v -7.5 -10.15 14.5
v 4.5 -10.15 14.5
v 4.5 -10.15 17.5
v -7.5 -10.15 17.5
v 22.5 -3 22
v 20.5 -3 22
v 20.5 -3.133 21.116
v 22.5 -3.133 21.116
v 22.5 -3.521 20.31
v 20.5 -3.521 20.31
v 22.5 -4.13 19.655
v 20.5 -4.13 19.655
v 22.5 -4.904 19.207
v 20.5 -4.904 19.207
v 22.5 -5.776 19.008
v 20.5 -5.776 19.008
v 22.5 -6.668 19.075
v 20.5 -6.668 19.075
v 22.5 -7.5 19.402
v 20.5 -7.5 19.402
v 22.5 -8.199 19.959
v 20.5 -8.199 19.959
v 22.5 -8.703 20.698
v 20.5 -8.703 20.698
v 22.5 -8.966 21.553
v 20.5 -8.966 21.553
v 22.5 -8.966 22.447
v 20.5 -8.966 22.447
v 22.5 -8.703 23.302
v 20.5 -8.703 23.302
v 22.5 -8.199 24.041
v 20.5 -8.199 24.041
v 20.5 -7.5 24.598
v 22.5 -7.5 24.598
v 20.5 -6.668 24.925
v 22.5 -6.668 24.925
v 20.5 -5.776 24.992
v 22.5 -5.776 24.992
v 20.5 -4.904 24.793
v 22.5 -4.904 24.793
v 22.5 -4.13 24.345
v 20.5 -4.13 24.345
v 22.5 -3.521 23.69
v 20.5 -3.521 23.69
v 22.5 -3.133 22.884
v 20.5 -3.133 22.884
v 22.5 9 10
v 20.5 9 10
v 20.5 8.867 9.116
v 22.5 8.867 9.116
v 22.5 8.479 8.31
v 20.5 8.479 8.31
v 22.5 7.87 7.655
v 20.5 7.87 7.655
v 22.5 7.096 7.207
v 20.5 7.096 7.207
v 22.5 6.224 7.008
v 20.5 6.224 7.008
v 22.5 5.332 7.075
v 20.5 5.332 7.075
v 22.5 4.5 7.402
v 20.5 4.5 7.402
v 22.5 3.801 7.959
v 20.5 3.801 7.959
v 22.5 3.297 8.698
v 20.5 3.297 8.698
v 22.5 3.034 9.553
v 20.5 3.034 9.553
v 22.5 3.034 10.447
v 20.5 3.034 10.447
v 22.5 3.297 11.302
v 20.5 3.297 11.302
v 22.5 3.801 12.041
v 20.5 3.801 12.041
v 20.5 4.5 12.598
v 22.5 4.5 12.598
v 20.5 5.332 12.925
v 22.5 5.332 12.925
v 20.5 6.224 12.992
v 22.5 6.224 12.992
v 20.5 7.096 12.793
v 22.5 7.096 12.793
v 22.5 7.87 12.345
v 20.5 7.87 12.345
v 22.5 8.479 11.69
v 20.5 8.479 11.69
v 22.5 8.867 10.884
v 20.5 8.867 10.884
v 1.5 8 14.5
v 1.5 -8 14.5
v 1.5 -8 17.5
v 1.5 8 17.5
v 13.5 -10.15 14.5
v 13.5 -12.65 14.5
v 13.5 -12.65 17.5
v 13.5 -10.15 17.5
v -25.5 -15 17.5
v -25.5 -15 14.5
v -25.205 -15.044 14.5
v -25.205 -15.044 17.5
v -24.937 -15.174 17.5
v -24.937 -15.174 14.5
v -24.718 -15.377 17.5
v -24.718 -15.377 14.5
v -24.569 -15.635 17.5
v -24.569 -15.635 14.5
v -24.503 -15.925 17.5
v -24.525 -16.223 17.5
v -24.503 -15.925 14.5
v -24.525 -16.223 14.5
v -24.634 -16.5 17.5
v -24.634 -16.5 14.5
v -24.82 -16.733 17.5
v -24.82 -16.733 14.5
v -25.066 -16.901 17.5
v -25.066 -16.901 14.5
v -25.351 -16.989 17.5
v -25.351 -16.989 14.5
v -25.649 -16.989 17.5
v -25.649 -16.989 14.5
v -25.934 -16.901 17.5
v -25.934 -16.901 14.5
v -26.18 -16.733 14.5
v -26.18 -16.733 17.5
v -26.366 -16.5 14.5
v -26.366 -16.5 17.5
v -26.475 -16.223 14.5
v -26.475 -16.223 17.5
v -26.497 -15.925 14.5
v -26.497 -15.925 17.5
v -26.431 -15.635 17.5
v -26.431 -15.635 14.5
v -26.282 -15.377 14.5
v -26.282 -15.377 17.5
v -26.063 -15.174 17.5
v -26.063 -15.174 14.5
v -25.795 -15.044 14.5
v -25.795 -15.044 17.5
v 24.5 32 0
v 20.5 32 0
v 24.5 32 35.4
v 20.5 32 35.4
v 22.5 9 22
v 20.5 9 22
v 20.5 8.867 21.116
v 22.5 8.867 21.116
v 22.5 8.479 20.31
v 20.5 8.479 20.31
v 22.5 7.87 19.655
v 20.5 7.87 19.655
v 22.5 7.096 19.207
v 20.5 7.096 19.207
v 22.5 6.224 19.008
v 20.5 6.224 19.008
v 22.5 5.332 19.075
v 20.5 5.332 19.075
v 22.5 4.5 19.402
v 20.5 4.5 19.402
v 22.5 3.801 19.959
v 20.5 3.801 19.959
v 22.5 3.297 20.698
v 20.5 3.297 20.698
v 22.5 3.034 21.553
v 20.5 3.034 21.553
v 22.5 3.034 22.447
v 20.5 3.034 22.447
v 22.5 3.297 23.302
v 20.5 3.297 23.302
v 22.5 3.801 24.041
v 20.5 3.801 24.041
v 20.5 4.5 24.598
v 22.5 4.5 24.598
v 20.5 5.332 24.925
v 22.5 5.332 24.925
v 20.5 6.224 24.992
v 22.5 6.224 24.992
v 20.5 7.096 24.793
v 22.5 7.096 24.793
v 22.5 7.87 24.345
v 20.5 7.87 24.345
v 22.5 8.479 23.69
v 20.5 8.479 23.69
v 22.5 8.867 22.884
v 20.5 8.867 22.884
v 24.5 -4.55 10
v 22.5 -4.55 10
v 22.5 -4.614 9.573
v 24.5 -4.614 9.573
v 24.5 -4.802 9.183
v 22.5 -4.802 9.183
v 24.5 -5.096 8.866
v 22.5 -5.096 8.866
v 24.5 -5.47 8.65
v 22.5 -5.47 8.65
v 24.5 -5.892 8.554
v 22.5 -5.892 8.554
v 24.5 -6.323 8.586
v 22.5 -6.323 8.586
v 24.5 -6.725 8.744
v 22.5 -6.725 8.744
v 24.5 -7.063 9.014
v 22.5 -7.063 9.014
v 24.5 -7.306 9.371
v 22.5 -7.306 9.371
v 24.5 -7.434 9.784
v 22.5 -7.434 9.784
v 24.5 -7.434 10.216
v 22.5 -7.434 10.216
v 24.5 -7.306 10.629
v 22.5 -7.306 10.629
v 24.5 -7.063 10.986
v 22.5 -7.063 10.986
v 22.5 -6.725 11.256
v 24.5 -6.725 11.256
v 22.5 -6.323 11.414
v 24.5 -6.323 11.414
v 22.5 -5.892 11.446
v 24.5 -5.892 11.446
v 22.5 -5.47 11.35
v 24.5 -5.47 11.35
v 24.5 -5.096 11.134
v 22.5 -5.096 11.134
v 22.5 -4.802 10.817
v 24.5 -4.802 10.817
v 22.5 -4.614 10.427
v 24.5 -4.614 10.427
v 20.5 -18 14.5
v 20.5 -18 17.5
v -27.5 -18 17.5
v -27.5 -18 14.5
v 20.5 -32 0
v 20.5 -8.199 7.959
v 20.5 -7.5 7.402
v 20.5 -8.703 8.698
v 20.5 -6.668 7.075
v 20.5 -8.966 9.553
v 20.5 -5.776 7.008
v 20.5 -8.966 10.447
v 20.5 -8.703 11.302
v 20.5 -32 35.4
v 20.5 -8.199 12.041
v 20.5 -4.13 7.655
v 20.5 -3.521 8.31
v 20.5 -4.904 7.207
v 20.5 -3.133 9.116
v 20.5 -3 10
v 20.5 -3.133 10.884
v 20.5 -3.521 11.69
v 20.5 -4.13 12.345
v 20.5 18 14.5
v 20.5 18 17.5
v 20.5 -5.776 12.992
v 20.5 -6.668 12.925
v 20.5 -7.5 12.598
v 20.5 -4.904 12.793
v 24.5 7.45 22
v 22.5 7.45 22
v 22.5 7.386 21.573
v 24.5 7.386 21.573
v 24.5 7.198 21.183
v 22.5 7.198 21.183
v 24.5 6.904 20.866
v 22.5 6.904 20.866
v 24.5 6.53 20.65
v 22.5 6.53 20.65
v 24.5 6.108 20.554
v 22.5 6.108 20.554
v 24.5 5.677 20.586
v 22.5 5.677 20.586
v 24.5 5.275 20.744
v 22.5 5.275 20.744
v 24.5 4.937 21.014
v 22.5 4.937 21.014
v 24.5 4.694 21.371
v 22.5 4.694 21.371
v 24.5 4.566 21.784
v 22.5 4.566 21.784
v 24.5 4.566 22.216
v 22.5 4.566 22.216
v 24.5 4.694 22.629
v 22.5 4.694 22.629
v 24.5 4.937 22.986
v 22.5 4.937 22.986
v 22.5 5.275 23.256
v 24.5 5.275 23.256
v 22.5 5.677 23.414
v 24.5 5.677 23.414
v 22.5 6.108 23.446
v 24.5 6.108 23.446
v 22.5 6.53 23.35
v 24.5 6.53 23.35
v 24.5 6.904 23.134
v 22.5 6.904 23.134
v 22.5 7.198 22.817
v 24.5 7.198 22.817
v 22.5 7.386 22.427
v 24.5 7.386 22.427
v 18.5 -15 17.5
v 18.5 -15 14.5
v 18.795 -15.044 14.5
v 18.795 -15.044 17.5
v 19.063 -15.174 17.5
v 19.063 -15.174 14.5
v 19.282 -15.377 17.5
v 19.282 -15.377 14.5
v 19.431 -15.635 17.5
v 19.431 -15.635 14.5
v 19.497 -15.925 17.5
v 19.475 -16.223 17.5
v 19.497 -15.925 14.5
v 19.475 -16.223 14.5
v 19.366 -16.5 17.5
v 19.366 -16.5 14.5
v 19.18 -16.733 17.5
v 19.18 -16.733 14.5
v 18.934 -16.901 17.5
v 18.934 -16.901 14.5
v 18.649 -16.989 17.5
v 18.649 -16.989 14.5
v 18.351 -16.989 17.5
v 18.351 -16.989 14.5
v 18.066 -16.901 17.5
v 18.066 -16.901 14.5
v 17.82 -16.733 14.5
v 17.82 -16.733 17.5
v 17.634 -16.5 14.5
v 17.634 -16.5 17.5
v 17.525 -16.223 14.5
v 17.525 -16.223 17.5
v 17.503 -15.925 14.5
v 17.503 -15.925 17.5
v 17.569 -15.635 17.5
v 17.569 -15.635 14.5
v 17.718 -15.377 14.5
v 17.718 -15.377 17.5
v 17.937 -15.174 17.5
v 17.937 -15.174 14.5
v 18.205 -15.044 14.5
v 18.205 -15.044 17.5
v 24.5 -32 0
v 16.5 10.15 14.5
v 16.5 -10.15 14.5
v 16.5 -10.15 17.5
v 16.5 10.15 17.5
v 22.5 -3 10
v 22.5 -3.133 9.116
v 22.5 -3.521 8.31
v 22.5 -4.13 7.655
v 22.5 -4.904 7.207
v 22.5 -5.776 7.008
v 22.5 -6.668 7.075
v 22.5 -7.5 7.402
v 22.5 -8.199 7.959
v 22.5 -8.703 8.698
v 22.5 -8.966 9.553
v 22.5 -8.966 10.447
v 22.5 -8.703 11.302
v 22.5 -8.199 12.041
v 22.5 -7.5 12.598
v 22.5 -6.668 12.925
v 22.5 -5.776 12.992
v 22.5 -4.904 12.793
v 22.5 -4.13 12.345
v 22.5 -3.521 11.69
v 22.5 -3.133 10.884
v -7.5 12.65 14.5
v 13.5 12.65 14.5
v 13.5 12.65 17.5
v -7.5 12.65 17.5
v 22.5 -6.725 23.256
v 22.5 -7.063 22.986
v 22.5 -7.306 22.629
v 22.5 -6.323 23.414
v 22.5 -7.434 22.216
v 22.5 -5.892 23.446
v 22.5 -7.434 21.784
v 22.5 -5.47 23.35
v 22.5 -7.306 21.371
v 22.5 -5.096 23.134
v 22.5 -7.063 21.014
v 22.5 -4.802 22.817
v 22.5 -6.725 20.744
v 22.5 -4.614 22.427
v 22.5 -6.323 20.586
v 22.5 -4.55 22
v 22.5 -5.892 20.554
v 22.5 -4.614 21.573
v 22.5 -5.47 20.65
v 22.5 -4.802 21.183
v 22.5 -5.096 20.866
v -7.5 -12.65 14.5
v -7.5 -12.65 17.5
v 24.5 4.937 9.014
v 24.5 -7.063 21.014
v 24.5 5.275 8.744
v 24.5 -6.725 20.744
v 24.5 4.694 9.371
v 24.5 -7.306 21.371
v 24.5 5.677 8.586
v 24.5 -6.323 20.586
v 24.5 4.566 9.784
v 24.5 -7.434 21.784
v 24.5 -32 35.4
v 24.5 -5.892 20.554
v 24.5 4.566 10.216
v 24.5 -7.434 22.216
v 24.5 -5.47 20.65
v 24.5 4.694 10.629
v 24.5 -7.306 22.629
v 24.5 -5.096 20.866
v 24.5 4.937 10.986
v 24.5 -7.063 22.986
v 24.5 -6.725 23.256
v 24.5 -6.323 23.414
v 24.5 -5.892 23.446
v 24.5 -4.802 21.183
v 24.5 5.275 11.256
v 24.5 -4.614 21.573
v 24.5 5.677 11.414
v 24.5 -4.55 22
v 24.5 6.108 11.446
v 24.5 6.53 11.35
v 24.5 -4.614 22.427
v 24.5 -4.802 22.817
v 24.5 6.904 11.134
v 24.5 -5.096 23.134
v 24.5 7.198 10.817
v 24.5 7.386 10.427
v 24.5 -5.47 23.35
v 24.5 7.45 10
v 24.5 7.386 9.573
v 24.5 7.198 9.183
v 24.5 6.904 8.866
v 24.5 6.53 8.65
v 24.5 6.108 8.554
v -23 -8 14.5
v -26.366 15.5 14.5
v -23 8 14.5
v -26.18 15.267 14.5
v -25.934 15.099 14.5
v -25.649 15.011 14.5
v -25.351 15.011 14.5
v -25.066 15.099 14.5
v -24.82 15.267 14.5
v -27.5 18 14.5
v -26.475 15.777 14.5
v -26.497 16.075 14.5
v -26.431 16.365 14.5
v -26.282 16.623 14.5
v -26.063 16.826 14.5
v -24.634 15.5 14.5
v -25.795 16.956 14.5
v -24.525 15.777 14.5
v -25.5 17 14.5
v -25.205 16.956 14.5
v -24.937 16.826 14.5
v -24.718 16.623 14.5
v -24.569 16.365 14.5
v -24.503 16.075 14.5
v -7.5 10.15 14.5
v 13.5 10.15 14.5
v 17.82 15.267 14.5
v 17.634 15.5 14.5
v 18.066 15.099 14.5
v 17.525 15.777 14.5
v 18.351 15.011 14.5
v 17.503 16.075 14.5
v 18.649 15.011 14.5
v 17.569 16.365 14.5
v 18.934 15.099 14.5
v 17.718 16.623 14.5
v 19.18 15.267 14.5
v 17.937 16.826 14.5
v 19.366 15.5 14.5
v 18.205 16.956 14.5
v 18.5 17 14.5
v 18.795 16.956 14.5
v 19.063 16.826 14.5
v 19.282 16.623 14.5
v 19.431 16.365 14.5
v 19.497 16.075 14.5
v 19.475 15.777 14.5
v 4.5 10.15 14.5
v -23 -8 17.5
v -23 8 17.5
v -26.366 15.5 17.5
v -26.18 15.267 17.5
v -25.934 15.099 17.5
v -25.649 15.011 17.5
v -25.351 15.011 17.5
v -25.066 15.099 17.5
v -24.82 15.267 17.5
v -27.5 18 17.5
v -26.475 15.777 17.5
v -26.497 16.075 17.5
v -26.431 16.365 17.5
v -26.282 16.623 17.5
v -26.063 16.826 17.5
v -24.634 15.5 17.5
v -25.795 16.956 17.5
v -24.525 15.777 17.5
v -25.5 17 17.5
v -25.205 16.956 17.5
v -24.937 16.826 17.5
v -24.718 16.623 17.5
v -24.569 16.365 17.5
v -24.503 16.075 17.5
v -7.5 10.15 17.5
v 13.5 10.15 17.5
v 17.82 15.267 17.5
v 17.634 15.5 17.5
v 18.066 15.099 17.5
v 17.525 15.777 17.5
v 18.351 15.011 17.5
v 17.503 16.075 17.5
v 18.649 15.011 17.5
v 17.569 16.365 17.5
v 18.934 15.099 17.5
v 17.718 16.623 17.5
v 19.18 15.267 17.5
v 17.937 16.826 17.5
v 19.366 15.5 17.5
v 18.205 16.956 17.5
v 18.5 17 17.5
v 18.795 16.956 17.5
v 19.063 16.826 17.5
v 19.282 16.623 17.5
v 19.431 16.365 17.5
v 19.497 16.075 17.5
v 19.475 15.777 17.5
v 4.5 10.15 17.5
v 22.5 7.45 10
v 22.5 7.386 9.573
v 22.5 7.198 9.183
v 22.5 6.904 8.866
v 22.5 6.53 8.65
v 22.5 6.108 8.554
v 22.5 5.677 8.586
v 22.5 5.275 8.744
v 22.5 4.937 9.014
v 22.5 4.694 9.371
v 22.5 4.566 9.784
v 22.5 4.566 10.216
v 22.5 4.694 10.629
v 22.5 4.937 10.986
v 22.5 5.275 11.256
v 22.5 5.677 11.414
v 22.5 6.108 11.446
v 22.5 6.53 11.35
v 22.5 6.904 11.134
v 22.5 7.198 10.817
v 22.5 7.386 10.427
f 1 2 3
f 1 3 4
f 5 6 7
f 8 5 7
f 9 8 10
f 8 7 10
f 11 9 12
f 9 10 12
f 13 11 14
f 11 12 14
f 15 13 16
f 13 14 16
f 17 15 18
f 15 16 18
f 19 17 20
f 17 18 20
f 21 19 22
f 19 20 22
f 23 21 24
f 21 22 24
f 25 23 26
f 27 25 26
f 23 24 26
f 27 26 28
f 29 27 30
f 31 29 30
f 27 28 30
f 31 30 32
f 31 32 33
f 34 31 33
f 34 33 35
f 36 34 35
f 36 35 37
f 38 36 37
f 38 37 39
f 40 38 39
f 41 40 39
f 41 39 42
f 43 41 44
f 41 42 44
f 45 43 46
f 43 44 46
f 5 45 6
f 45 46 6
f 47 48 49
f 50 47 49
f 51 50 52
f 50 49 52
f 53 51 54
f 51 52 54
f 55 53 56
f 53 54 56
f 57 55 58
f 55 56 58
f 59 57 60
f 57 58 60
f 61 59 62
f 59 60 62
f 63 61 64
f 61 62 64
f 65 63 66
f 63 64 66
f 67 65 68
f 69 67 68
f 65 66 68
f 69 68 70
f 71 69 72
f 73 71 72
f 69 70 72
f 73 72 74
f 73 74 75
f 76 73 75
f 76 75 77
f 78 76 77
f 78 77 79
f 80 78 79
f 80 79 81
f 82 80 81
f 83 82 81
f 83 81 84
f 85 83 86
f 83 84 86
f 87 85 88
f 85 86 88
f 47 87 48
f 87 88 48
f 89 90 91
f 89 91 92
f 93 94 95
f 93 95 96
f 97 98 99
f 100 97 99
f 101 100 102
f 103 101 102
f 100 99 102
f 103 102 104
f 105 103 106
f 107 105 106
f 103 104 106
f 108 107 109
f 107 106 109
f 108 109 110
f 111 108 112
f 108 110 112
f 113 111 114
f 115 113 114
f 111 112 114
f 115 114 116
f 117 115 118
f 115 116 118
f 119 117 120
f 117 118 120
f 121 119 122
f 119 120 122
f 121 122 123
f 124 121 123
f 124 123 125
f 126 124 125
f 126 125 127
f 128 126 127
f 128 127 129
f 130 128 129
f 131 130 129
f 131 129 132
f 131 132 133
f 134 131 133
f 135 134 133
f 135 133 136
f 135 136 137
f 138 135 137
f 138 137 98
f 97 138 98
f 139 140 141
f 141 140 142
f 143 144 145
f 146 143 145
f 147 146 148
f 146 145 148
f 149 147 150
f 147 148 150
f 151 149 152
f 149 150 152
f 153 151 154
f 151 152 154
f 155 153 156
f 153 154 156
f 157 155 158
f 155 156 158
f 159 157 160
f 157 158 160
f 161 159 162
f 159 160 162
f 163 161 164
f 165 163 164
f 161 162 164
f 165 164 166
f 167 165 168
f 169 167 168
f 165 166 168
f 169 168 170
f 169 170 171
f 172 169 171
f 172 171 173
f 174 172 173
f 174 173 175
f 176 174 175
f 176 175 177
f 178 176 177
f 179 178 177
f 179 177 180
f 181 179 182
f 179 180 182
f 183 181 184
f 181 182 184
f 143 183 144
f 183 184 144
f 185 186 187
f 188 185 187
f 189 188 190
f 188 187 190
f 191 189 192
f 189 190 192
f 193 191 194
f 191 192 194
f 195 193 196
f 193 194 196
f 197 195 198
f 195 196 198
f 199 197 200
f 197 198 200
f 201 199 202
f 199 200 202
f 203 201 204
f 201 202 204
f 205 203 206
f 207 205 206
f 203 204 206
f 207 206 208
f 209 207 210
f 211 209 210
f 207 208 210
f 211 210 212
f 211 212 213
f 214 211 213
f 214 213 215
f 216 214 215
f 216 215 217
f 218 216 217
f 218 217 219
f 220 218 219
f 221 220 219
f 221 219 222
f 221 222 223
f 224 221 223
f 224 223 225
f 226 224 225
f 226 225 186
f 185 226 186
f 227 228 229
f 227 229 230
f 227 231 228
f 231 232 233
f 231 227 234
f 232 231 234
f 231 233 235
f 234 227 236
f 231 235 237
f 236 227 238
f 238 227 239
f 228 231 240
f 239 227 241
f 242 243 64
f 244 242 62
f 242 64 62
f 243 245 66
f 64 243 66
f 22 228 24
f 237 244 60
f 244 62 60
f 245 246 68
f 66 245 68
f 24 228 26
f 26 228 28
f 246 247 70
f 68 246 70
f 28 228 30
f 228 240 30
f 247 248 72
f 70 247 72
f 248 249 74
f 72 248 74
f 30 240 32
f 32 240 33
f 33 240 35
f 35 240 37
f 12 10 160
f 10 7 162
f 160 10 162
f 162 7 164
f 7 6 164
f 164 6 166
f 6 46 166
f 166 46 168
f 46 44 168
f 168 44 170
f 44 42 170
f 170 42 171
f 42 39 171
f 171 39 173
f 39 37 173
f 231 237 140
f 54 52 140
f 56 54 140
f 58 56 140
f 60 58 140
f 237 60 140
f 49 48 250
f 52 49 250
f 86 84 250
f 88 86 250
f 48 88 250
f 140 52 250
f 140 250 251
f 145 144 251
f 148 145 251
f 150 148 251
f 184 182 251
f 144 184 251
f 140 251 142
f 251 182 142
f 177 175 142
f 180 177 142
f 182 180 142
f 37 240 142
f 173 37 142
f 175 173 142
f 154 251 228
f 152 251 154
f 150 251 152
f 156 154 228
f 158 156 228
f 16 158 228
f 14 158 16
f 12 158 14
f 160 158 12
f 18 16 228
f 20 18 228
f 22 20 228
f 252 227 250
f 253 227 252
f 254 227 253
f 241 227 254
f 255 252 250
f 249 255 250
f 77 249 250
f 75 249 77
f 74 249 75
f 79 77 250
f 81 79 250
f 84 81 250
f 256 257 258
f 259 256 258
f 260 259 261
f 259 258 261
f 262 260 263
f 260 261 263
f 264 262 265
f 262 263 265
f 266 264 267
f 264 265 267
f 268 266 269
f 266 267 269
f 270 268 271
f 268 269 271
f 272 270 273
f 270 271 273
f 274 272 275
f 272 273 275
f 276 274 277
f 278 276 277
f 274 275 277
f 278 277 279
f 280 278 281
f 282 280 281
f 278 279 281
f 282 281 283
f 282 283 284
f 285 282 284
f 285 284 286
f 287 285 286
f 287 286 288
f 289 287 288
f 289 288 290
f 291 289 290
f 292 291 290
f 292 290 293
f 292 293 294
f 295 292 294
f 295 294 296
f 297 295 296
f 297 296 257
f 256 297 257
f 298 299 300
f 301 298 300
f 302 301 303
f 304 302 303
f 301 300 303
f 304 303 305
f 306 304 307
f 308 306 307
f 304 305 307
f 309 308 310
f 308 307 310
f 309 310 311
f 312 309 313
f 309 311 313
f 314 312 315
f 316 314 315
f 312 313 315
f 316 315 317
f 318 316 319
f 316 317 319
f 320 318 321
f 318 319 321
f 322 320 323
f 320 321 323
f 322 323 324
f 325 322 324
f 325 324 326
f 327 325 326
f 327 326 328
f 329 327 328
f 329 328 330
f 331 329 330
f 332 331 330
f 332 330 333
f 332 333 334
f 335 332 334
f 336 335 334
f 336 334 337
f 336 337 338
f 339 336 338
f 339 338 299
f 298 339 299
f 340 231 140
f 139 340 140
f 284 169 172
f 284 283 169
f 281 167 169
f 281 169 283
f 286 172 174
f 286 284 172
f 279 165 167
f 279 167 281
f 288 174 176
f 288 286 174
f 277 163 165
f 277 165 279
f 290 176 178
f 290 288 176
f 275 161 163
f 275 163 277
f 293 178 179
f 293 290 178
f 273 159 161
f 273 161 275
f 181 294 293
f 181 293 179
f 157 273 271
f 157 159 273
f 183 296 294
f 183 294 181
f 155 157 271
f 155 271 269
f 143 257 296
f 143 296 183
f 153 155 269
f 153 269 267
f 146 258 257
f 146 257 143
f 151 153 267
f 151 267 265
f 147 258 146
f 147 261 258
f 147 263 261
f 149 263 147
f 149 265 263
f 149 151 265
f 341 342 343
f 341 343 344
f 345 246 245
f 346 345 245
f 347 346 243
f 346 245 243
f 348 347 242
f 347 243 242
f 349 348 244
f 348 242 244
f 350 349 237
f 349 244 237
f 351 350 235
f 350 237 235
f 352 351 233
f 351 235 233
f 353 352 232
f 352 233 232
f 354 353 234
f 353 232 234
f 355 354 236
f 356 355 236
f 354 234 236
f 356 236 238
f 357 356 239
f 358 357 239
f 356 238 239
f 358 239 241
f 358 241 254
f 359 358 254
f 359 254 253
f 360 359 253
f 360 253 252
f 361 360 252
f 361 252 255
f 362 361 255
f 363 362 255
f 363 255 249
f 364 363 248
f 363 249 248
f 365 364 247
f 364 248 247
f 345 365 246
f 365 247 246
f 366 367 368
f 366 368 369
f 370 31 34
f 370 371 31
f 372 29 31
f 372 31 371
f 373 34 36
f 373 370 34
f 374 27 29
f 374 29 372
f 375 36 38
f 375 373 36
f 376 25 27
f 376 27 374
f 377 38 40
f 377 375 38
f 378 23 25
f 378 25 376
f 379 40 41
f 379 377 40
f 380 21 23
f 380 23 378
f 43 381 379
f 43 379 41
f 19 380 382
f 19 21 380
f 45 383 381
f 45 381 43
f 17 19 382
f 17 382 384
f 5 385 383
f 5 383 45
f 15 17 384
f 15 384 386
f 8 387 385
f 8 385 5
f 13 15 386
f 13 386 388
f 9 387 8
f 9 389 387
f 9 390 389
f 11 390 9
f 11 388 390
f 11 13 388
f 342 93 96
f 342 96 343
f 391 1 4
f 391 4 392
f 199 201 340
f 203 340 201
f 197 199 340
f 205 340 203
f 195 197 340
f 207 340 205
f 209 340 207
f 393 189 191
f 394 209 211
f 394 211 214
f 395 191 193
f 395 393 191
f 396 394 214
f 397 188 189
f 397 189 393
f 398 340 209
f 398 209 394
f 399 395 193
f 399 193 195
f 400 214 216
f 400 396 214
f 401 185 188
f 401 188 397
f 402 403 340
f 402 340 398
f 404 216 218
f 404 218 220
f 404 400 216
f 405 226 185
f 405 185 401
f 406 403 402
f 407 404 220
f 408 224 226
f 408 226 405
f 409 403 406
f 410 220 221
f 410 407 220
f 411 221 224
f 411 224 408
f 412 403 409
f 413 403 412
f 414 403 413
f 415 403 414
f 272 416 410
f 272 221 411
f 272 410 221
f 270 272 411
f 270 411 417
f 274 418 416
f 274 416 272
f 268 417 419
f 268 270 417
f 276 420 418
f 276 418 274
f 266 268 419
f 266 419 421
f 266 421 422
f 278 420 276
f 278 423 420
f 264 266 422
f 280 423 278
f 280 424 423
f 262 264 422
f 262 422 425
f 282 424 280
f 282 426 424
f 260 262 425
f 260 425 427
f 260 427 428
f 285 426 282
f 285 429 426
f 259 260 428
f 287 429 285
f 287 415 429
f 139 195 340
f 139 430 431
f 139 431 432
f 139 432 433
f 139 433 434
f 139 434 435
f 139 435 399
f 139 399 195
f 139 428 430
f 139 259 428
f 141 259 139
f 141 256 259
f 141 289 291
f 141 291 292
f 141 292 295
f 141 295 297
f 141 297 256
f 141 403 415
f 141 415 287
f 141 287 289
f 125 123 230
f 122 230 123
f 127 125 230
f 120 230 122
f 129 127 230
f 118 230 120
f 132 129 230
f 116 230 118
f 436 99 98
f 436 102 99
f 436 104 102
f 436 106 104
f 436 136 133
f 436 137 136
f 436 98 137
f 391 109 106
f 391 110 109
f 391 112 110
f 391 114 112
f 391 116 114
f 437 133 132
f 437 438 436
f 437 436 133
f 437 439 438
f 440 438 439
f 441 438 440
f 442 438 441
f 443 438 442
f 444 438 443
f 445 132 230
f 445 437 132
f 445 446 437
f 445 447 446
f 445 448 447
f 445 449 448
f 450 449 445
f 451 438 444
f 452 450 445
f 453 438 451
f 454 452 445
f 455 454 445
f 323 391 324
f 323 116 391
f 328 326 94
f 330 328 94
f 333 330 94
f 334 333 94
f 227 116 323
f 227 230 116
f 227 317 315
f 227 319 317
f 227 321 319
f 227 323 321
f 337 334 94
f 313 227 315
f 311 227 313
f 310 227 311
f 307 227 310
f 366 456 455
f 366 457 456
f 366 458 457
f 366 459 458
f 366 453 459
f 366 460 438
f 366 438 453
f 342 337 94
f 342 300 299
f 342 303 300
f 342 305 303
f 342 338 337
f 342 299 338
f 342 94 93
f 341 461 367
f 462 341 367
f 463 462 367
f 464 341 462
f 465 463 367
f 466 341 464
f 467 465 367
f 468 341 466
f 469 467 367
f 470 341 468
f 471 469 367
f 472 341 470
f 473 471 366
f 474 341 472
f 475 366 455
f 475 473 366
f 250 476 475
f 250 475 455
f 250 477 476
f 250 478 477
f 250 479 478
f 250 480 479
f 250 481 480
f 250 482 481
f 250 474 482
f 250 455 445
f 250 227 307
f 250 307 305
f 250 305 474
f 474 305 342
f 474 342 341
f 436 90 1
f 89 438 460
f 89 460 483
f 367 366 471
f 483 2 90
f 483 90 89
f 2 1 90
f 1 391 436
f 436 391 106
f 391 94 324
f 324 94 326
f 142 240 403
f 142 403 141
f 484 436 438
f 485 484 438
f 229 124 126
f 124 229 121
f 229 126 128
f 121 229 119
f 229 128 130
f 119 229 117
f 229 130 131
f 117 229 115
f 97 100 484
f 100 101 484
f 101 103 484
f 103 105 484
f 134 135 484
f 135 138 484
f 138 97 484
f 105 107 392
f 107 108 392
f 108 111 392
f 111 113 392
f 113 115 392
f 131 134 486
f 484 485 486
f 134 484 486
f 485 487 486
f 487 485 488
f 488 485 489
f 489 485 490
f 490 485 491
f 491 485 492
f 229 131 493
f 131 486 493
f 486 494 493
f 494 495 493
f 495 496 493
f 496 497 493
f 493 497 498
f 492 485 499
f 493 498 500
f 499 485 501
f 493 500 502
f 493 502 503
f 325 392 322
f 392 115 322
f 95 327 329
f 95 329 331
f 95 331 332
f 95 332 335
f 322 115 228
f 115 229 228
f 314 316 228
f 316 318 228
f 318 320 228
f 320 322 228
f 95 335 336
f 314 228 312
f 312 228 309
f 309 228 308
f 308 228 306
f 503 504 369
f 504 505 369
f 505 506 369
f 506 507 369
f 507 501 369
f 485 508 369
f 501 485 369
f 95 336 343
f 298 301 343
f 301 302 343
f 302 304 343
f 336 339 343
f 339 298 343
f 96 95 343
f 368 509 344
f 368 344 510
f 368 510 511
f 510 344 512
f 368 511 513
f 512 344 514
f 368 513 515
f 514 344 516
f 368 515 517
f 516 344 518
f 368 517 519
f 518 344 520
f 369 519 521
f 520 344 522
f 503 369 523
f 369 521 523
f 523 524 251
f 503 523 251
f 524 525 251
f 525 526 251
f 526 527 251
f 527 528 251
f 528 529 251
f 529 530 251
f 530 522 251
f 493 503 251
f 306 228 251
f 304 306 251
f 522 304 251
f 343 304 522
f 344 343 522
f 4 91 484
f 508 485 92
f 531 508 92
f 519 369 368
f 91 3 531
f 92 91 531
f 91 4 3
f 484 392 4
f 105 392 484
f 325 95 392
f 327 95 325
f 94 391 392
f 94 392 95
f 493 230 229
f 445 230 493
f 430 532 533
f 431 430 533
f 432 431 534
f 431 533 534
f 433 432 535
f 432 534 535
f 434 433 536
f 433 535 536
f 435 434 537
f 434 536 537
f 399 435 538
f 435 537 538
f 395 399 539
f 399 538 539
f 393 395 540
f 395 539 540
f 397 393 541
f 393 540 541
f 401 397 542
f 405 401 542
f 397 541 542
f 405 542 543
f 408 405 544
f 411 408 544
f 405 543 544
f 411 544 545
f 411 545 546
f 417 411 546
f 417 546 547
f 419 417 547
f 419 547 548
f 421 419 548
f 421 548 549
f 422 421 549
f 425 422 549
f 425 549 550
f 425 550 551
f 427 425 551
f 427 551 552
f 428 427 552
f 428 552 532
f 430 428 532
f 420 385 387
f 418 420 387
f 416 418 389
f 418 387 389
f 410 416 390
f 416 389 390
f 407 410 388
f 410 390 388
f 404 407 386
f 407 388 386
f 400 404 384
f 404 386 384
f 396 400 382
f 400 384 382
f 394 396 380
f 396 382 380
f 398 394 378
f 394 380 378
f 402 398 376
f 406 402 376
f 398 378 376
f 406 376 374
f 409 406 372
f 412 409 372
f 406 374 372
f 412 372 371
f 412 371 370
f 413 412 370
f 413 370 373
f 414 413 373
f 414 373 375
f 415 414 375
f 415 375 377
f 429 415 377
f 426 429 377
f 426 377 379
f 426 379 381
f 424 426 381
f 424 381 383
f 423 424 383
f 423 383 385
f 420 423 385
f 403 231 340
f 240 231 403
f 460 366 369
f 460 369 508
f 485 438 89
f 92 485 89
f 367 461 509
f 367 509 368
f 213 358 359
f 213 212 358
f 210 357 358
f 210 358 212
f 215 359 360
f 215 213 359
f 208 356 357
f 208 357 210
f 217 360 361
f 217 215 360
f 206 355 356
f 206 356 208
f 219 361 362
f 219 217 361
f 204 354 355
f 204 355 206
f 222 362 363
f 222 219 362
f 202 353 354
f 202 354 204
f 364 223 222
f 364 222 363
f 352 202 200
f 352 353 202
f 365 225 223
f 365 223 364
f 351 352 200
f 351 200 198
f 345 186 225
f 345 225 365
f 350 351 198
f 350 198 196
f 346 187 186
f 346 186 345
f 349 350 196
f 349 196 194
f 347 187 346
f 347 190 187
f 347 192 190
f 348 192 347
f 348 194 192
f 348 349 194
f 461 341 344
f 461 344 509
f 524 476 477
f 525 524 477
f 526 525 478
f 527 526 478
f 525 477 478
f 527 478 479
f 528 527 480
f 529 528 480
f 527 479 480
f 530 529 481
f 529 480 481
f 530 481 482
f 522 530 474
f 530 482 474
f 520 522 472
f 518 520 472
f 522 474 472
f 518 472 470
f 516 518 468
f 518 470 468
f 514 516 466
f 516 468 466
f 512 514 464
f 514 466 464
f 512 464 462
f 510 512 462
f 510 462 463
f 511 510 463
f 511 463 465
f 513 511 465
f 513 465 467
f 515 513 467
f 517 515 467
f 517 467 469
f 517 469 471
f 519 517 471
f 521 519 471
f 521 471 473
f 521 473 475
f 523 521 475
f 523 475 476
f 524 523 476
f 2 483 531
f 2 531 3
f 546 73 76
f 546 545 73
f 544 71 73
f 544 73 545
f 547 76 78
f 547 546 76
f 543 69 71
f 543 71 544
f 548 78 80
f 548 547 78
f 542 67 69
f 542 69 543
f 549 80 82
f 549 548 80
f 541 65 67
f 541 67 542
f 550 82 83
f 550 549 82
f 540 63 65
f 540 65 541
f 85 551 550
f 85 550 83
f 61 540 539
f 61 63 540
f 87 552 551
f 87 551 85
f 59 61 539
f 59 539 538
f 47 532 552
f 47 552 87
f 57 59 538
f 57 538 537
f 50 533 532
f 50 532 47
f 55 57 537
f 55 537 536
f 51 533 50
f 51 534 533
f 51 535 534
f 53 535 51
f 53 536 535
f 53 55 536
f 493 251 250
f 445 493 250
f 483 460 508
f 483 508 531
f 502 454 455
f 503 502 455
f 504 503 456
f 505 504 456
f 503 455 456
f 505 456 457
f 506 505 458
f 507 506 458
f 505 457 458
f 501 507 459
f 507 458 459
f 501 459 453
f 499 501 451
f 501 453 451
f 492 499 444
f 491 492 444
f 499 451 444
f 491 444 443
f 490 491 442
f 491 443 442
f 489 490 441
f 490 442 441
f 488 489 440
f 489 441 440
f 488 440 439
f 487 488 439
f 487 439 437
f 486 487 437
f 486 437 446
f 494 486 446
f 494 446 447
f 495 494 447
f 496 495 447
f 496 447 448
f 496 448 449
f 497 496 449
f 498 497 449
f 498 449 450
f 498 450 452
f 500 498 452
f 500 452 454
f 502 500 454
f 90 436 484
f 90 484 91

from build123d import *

# Parameters (mm, degrees)
SKETCH005_W     = 64
SKETCH005_H     = 35.4
PAD_DEPTH       = 4
SKETCH_R        = 3
POCKET_DEPTH    = 2
SKETCH006_R     = 1.45
POCKET001_DEPTH = 5
SKETCH007_W     = 36
SKETCH007_H     = 3
PAD001_DEPTH    = 48
SKETCH008_R     = 1
SKETCH008_W     = 16
SKETCH008_H     = 24.5
POCKET002_DEPTH = 5


with BuildPart() as part:
    # Sketch005 → Pad (new body)
    with BuildSketch(Plane.YZ.offset(20.5)):
        with Locations((0, 17.7)):
            Rectangle(SKETCH005_W, SKETCH005_H)
    extrude(amount=PAD_DEPTH)

    # Sketch (on Face5 of Pad) → Pocket (cut)
    with BuildSketch(Plane(origin=(20.5, 0, 0), x_dir=(0, 1, 0), z_dir=(-1, 0, 0))):
        with Locations((6, -22)):
            Circle(SKETCH_R)
        with Locations((-6, -22)):
            Circle(SKETCH_R)
        with Locations((6, -10)):
            Circle(SKETCH_R)
        with Locations((-6, -10)):
            Circle(SKETCH_R)
    extrude(amount=-POCKET_DEPTH, mode=Mode.SUBTRACT)

    # Sketch006 (on Face4 of Pocket) → Pocket001 (cut)
    with BuildSketch(Plane(origin=(20.5, 0, 0), x_dir=(0, 1, 0), z_dir=(-1, 0, 0))):
        with Locations((6, -22)):
            Circle(SKETCH006_R)
        with Locations((-6, -22)):
            Circle(SKETCH006_R)
        with Locations((6, -10)):
            Circle(SKETCH006_R)
        with Locations((-6, -10)):
            Circle(SKETCH006_R)
    extrude(amount=-POCKET001_DEPTH, mode=Mode.SUBTRACT)

    # Sketch007 (on Face4 of Pocket001) → Pad001 (join)
    with BuildSketch(Plane(origin=(20.5, 0, 0), x_dir=(0, 1, 0), z_dir=(-1, 0, 0))):
        with Locations((0, -16)):
            Rectangle(SKETCH007_W, SKETCH007_H)
    extrude(amount=PAD001_DEPTH)

    # Sketch008 (on Face9 of Pad001) → Pocket002 (cut)
    with BuildSketch(Plane(origin=(20.5, 0, 14.5), x_dir=(0, 1, 0), z_dir=(0, 0, -1))):
        with Locations((16, -46)):
            Circle(SKETCH008_R)
        with Locations((-16, -46)):
            Circle(SKETCH008_R)
        with Locations((16, -2)):
            Circle(SKETCH008_R)
        with Locations((-16, -2)):
            Circle(SKETCH008_R)
        Polygon((12.65, -28), (10.15, -28), (10.15, -16), (-10.15, -16), (-10.15, -28), (-12.65, -28), (-12.65, -7), (-10.15, -7), (-10.15, -4), (10.15, -4), (10.15, -7), (12.65, -7), align=None)
        with Locations((0, -31.25)):
            Rectangle(SKETCH008_W, SKETCH008_H)
    extrude(amount=-POCKET002_DEPTH, mode=Mode.SUBTRACT)


solid = part.part
